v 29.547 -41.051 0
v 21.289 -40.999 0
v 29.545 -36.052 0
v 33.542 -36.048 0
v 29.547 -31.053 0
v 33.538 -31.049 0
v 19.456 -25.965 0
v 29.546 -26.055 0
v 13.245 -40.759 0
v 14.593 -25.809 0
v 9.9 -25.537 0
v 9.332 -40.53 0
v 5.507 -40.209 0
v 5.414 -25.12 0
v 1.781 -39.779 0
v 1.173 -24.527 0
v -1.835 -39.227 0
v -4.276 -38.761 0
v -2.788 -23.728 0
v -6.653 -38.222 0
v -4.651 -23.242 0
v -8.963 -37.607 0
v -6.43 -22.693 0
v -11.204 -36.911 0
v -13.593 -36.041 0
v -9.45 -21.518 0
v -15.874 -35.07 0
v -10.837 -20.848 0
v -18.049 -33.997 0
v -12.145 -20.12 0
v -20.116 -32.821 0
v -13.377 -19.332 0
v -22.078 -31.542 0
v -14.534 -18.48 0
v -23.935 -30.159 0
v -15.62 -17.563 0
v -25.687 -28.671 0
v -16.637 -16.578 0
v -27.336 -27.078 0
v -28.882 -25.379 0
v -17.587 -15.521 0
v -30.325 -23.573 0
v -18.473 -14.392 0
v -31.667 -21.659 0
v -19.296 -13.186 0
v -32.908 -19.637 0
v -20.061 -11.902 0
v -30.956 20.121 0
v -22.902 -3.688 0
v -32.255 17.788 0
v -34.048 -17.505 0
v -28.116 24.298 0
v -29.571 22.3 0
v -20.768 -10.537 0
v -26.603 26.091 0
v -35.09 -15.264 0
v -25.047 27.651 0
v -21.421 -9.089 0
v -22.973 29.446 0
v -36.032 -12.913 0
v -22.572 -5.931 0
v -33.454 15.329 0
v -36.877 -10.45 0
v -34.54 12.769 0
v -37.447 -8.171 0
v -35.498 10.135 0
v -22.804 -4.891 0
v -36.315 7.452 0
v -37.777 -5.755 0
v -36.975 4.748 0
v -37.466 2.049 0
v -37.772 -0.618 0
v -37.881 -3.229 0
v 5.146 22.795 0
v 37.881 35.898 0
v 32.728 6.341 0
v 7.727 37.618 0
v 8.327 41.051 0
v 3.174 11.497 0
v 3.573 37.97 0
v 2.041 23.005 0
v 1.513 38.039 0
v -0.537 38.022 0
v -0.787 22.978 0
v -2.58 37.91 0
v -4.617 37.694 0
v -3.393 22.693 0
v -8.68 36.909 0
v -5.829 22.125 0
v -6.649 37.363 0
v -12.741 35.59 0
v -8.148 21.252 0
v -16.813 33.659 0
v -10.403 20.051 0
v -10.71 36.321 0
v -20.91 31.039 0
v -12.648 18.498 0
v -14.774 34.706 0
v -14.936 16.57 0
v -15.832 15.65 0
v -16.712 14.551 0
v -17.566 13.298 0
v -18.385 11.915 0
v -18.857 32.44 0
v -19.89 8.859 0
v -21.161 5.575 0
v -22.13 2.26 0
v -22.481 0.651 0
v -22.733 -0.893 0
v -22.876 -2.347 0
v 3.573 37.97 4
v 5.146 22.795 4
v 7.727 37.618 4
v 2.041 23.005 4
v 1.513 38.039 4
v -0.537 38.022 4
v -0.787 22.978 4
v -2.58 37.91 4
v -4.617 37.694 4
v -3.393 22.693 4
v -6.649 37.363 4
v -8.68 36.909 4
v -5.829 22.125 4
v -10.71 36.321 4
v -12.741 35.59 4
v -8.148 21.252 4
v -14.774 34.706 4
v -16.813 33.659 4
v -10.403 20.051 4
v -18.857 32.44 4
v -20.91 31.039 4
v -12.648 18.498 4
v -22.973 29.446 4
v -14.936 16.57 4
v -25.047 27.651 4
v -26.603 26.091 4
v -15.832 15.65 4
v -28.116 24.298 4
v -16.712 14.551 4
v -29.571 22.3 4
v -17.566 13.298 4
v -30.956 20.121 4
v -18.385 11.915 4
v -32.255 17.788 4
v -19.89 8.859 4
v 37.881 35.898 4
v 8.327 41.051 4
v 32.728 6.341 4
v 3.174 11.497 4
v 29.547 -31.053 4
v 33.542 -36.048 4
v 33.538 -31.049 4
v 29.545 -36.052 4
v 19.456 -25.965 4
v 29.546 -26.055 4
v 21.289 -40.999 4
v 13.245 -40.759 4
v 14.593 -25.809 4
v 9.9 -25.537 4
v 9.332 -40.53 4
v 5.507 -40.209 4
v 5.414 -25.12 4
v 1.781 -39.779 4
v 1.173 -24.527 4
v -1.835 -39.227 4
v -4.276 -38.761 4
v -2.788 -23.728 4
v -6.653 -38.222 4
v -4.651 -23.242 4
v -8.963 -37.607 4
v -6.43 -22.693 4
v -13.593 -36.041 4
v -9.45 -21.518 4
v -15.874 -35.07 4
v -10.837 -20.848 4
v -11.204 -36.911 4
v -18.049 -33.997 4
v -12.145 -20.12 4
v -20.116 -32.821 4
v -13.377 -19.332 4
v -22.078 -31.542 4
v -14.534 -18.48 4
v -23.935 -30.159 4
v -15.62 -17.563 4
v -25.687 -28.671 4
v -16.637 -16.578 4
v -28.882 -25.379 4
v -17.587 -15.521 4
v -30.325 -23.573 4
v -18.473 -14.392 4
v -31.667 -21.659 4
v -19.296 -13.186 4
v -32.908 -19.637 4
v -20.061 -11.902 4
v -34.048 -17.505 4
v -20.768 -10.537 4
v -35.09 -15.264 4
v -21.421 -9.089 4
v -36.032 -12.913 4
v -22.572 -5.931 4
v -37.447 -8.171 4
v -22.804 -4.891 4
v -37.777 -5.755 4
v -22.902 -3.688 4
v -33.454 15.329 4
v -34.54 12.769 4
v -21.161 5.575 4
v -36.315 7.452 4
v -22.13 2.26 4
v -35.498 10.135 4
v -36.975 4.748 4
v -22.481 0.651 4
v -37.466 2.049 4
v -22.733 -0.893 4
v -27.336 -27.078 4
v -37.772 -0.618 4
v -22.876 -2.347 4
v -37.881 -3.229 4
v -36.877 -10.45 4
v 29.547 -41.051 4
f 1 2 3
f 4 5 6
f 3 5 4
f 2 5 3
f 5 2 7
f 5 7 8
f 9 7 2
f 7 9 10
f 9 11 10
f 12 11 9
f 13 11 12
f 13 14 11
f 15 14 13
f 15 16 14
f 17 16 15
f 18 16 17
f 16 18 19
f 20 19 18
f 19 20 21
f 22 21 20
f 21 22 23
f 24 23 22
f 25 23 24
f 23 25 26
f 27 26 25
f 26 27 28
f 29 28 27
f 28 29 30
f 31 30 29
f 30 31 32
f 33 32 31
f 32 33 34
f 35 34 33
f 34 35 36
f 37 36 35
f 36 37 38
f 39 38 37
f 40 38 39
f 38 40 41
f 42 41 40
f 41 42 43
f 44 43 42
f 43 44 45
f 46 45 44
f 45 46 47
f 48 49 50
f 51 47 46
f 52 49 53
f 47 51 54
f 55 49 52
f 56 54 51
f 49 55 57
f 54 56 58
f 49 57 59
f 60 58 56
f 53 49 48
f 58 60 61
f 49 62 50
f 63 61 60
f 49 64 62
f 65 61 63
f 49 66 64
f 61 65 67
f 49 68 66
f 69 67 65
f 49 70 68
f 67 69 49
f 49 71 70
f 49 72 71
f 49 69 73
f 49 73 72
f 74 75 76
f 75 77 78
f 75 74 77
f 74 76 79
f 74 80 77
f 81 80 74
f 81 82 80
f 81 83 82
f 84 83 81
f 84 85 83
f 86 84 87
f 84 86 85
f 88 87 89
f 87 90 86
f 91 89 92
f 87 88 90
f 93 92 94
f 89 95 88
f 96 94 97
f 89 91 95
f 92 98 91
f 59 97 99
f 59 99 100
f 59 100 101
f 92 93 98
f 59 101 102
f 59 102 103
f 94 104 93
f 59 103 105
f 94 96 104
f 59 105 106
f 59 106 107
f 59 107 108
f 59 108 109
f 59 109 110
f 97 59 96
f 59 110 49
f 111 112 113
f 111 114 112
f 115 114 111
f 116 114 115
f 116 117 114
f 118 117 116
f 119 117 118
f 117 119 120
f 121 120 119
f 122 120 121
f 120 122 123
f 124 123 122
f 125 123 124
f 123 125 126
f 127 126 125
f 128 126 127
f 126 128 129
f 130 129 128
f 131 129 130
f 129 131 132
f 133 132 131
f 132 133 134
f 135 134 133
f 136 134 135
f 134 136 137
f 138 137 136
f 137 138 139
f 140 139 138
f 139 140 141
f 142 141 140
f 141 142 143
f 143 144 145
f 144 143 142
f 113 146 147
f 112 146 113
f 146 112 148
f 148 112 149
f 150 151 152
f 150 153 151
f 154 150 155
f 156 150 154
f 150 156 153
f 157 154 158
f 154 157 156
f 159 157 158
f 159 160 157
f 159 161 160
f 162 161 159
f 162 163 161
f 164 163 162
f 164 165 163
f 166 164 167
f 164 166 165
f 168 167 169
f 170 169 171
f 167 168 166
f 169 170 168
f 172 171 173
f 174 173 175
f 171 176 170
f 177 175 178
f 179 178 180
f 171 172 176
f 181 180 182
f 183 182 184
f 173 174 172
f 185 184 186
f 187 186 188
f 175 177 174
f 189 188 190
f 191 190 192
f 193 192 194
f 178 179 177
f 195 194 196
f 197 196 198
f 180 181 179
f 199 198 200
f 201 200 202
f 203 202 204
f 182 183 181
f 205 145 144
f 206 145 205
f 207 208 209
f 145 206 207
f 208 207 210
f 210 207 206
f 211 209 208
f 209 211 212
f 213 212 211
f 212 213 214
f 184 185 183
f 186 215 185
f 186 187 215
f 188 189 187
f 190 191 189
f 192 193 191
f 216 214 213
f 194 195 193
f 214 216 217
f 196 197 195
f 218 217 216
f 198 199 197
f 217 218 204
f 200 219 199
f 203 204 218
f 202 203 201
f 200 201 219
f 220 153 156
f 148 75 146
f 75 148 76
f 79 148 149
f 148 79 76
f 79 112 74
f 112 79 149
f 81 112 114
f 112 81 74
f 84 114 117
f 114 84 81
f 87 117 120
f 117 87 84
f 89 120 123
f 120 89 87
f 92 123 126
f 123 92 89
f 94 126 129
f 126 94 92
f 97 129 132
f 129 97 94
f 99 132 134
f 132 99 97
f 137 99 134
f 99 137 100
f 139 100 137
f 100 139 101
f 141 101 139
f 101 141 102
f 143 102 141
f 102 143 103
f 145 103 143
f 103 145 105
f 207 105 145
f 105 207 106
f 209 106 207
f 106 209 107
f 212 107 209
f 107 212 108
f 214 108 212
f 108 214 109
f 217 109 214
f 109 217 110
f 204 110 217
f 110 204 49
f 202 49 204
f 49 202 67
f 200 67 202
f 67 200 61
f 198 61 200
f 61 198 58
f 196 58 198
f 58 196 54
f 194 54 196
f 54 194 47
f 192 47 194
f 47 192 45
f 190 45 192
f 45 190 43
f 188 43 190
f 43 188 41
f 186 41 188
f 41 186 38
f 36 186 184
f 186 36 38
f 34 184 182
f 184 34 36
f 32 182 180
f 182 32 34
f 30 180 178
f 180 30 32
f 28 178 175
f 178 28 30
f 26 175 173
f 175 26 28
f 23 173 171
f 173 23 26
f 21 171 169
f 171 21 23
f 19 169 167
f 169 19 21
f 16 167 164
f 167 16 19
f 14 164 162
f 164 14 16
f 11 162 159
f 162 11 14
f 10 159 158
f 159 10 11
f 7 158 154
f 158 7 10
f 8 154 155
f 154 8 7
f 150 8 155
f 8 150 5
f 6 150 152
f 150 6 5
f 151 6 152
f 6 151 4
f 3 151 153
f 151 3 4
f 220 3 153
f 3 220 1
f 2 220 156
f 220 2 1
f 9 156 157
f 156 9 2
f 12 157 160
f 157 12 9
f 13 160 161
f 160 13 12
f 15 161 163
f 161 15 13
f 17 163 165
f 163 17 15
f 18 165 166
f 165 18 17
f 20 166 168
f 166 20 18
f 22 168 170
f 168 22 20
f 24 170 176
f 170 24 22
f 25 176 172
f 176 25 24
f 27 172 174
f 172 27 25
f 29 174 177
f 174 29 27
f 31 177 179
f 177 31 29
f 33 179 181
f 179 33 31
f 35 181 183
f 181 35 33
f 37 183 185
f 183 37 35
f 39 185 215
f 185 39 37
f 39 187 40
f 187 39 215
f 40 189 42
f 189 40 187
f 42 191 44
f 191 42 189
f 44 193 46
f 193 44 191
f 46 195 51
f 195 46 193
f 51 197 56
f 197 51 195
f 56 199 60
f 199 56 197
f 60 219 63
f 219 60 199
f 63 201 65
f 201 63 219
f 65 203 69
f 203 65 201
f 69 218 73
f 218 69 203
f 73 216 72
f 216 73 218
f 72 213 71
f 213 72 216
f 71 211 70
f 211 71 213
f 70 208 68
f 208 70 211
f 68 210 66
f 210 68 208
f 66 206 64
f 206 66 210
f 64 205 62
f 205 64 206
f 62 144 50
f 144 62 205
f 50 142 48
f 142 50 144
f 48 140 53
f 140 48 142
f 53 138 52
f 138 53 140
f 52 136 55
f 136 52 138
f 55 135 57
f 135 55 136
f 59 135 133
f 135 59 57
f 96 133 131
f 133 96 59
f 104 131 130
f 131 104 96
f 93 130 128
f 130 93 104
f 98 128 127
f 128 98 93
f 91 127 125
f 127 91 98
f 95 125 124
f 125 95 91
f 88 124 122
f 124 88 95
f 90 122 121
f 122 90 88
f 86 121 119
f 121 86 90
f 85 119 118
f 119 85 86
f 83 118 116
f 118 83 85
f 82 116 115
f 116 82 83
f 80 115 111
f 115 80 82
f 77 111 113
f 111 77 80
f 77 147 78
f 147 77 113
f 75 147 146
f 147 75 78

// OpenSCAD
// Module names are of the form poly_<inkscape-path-id>().  As a result,
// you can associate a polygon in this OpenSCAD program with the corresponding
// SVG element in the Inkscape document by looking for the XML element with
// the attribute id="inkscape-path-id".

// fudge value is used to ensure that subtracted solids are a tad taller
// in the z dimension than the polygon being subtracted from.  This helps
// keep the resulting .stl file manifold.
fudge = 0.1;

module poly_path3033(h)
{
  scale([25.4/90, -25.4/90, 1]) union()
  {
    linear_extrude(height=h)
      polygon([[104.694983,110.031875],[118.833733,110.016875],[118.849983,127.729375],[104.687483,127.744375],[104.692483,145.456875],[75.432815,145.271133],[46.931702,144.420938],[33.066568,143.611099],[19.512229,142.472461],[6.309072,140.950796],[-6.502517,138.991875],[-15.150368,137.340527],[-23.572517,135.433594],[-31.758415,133.254551],[-39.697517,130.786875],[-48.163763,127.703949],[-56.247600,124.262683],[-63.951523,120.460520],[-71.278025,116.294902],[-78.229600,111.763271],[-84.808743,106.863069],[-91.017946,101.591737],[-96.859704,95.946719],[-102.336512,89.925455],[-107.450862,83.525388],[-112.205248,76.743960],[-116.602165,69.578613],[-120.644107,62.026789],[-124.333567,54.085930],[-127.673039,45.753478],[-130.665017,37.026875],[-132.686444,28.951319],[-133.856040,20.391194],[-134.223733,11.439989],[-133.839451,2.191191],[-132.753120,-7.261710],[-131.014668,-16.825227],[-128.674022,-26.405872],[-125.781111,-35.910156],[-122.385860,-45.244592],[-118.538198,-54.315691],[-114.288052,-63.029965],[-109.685349,-71.293926],[-104.780017,-79.014085],[-99.621982,-86.096956],[-94.261173,-92.449048],[-88.747517,-97.976875],[-81.398659,-104.335265],[-74.090639,-109.979756],[-66.817304,-114.944720],[-59.572497,-119.264531],[-52.350067,-122.973561],[-45.143857,-126.106182],[-37.947715,-128.696766],[-30.755486,-130.779688],[-23.561015,-132.389318],[-16.358149,-133.560029],[-9.140734,-134.326195],[-1.902615,-134.722188],[5.362363,-134.782379],[12.660352,-134.541143],[27.379983,-133.291875],[29.504983,-145.456875],[134.223733,-127.196875],[115.964983,-22.468125],[11.246233,-40.738125],[18.232483,-80.770625],[7.232573,-81.512224],[-2.789685,-81.418262],[-12.022305,-80.406692],[-20.653298,-78.395469],[-28.870679,-75.302546],[-36.862458,-71.045879],[-44.816650,-65.543420],[-52.921267,-58.713125],[-56.098967,-55.451581],[-59.215056,-51.558037],[-62.240266,-47.118737],[-65.145329,-42.219922],[-70.477947,-31.388721],[-74.978767,-19.754375],[-78.413650,-8.006826],[-79.658196,-2.306207],[-80.548454,3.163984],[-81.055159,8.317506],[-81.149040,13.068115],[-80.800832,17.329569],[-79.981267,21.015625],[-75.901035,32.204050],[-73.588023,37.336346],[-71.081599,42.172715],[-68.373151,46.722173],[-65.454067,50.993733],[-62.315737,54.996410],[-58.949548,58.739219],[-55.346890,62.231173],[-51.499150,65.481287],[-47.397718,68.498575],[-43.033982,71.292051],[-38.399330,73.870730],[-33.485151,76.243625],[-22.783767,80.408125],[-16.479740,82.353581],[-9.877629,84.076243],[4.155413,86.906895],[19.184490,89.007498],[35.078733,90.485469],[51.707273,91.448225],[68.939241,92.003184],[104.689983,92.319375],[104.694983,110.031875]]);
  }
}

module poly_path3037(h)
{
  scale([25.4/90, -25.4/90, 1]) union()
  {
    linear_extrude(height=h)
      polygon([[86.906858,-83.968375],[86.618936,-81.112052],[85.793167,-78.451695],[84.486548,-76.044288],[82.756077,-73.946813],[80.658750,-72.216251],[78.251565,-70.909586],[75.591519,-70.083800],[72.735608,-69.795875],[69.879231,-70.083800],[67.218733,-70.909586],[64.811126,-72.216251],[62.713421,-73.946813],[60.982630,-76.044288],[59.675764,-78.451695],[58.849837,-81.112052],[58.561858,-83.968375],[58.849837,-86.824698],[59.675764,-89.485055],[60.982630,-91.892462],[62.713421,-93.989937],[64.811126,-95.720499],[67.218733,-97.027164],[69.879231,-97.852950],[72.735608,-98.140875],[75.591519,-97.852950],[78.251565,-97.027164],[80.658750,-95.720499],[82.756077,-93.989937],[84.486548,-91.892462],[85.793167,-89.485055],[86.618936,-86.824698],[86.906858,-83.968375]]);
  }
}

module poly_path3041(h)
{
  scale([25.4/90, -25.4/90, 1]) union()
  {
    linear_extrude(height=h)
      polygon([[69.192608,-83.969000],[69.471026,-82.589996],[70.230264,-81.463531],[71.356299,-80.703863],[72.735108,-80.425250],[74.114639,-80.703863],[75.241046,-81.463531],[76.000421,-82.589996],[76.278858,-83.969000],[76.000421,-85.347281],[75.241046,-86.473375],[74.114639,-87.232906],[72.735108,-87.511500],[71.356299,-87.232906],[70.230264,-86.473375],[69.471026,-85.347281],[69.192608,-83.969000]]);
  }
}

poly_path3033(4);
poly_path3037(4);
poly_path3041(4);
